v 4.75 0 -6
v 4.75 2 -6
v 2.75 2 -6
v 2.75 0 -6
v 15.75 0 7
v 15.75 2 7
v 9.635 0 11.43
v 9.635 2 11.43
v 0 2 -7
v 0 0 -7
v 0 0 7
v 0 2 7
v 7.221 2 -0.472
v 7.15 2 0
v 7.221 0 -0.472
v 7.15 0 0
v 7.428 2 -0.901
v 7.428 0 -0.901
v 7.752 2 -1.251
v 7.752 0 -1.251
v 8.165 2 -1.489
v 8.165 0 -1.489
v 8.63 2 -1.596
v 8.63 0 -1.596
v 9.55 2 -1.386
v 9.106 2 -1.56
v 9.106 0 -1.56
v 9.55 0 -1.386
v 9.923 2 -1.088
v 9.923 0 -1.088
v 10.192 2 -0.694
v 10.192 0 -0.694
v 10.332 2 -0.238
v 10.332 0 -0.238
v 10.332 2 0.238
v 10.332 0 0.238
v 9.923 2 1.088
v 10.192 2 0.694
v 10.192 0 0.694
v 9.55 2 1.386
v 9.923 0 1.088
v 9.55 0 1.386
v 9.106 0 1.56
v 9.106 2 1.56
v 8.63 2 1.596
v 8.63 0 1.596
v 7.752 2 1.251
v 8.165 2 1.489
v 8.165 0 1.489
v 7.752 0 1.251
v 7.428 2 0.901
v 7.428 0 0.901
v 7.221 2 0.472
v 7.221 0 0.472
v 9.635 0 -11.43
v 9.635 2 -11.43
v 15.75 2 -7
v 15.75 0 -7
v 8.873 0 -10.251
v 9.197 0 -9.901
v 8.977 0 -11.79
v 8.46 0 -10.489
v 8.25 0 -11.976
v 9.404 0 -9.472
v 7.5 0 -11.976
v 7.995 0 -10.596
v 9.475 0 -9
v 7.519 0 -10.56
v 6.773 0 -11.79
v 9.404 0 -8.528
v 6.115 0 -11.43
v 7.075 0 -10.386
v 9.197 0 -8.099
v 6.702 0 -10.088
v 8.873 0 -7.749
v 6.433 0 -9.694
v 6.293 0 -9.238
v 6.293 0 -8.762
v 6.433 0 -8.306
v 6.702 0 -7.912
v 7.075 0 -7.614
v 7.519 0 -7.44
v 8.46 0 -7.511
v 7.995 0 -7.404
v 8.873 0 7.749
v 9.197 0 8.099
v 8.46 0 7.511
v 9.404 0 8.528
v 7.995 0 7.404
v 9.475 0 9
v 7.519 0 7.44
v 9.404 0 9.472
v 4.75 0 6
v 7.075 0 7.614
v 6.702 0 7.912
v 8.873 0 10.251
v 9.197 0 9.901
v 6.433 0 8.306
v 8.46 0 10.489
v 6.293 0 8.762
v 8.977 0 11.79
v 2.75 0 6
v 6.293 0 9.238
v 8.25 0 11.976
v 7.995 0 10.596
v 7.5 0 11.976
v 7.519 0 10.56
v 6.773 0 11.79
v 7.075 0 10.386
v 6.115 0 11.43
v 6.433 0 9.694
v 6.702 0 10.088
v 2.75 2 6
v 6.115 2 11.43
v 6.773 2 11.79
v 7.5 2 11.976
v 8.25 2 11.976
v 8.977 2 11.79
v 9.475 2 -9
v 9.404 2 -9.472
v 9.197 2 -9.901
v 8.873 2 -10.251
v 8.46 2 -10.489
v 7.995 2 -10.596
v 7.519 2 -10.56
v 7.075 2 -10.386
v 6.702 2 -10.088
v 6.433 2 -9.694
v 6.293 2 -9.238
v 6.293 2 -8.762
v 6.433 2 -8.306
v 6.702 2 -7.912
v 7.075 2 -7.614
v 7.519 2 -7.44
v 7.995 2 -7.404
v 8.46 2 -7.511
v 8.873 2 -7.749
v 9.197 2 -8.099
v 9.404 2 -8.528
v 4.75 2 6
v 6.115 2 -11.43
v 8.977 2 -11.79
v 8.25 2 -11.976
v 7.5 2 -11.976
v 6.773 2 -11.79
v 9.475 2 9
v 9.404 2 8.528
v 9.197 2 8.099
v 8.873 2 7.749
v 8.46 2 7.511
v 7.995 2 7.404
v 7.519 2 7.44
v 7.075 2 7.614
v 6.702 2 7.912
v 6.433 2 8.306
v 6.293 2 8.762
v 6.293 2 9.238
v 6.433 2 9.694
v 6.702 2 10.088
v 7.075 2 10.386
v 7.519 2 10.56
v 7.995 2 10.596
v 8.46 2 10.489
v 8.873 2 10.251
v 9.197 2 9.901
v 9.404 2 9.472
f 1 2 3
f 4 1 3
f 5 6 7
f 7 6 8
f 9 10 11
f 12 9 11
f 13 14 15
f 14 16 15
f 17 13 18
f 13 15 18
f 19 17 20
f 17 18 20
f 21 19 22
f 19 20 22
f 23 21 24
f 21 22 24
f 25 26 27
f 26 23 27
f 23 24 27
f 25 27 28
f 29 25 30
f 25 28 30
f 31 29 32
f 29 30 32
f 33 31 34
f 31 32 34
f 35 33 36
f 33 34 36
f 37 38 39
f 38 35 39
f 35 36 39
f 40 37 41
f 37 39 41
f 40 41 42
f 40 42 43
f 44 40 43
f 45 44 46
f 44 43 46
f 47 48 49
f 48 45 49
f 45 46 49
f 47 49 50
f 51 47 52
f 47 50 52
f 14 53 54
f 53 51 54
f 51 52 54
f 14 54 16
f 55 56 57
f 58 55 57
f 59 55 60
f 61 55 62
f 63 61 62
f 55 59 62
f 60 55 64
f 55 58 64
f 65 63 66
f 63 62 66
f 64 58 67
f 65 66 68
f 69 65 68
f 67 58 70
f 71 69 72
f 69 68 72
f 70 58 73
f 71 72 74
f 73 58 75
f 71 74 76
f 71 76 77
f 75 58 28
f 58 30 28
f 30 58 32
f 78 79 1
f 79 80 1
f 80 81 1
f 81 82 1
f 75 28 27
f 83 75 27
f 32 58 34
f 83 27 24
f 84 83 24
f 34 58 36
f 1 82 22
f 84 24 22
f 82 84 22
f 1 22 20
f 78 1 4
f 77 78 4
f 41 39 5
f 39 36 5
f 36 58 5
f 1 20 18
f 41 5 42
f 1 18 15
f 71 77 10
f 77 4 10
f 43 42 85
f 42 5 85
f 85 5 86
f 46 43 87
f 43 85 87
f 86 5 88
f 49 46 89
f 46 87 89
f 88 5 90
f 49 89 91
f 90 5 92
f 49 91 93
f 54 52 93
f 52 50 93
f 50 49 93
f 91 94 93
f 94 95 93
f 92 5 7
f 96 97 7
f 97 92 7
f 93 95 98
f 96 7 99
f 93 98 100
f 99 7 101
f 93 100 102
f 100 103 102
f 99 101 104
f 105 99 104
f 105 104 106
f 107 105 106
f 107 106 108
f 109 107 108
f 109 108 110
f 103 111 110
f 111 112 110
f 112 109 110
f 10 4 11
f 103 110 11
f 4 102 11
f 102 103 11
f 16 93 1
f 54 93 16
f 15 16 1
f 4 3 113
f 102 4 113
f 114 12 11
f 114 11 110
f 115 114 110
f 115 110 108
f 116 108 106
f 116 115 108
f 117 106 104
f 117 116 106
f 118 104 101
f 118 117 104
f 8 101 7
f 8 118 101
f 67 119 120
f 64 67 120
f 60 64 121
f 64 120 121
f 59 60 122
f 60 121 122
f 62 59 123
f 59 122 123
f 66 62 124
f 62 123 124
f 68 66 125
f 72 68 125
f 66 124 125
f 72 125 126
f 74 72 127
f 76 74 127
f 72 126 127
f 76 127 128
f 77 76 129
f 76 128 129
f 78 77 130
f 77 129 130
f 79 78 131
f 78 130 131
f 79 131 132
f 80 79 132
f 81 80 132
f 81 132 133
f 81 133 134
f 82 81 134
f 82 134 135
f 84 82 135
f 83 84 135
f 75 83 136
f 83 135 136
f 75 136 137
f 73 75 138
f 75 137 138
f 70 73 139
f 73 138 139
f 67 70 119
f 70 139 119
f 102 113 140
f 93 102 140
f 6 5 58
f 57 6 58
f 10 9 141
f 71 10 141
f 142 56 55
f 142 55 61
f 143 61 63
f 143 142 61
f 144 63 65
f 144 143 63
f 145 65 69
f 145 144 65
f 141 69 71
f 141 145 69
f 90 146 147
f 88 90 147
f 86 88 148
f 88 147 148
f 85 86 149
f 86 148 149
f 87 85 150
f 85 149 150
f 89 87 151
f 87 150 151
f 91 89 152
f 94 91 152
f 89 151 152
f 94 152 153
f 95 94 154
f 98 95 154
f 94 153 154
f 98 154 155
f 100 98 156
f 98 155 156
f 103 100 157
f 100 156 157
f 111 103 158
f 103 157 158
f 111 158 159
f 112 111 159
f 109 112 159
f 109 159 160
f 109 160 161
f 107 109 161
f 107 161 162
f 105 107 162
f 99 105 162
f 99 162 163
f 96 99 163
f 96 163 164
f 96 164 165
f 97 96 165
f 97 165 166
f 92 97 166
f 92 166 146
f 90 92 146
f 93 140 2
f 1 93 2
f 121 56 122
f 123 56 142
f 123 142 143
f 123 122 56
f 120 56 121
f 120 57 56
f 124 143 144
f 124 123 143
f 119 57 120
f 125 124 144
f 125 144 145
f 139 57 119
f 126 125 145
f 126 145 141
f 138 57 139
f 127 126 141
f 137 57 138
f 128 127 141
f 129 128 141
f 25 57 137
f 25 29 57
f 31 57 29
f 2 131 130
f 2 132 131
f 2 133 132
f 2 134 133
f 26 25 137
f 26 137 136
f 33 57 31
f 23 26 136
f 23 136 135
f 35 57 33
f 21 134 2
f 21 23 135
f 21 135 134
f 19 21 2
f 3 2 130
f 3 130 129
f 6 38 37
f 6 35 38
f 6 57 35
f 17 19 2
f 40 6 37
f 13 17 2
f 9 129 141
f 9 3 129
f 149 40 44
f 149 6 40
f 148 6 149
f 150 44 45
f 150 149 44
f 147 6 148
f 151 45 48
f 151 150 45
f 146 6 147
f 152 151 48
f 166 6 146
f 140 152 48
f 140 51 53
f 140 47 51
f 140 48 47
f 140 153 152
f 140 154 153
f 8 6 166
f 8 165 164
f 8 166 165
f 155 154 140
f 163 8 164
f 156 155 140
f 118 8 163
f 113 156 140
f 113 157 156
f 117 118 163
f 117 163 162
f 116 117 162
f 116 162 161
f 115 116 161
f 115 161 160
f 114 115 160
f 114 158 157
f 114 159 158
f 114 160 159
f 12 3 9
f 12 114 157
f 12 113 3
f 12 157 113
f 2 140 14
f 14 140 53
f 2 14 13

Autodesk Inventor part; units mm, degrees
ref_plane "YZ Plane" through (0, 0, 0) normal (1, 0, 0) x (0, 1, 0)
ref_plane "XZ Plane" through (0, 0, 0) normal (0, 1, 0) x (-1, 0, 0)
ref_plane "XY Plane" through (0, 0, 0) normal (0, 0, 1) x (1, 0, 0)
sketch "Эскиз1" plane through (0, 0, 0) normal (0, 1, 0) x (-1, 0, 0)
  line L0 (-15.75, 7) -> (15.75, 7) construction
  line L1 (15.75, 7) -> (15.75, -7) construction
  line L2 (15.75, -7) -> (-15.75, -7) construction
  line L3 (-15.75, -7) -> (-15.75, 7) construction
  line L4 (-15.75, 7) -> (15.75, -7) construction
  line L5 (15.75, 7) -> (-15.75, -7) construction
  line L6 (0, 7) -> (-15.75, 7)
  line L7 (-15.75, 7) -> (-15.75, -7)
  line L8 (-15.75, -7) -> (0, -7)
  line L9 (0, -7) -> (0, 7)
  circle A0 centre (-8.75, 0) radius 1.6
  point P0 (0, 0)
  dimension "d0" = 31.5
  dimension "d1" = 14
  dimension "d2" = 3.2
  dimension "d3" = 7
extrude "Выдавливание1" add sketch "Эскиз1" along normal blind 2
sketch "Эскиз2" plane through (0, 2, 0) normal (0, 1, 0) x (1, 0, 0)
  circle A0 centre (8.75, 0) radius 1.6 projected
  circle A1 centre (7.875, 9) radius 1.6
  circle A2 centre (7.875, -9) radius 1.6
  line L0 (0, -7) -> (15.75, -7) projected
  line L1 (15.75, 7) -> (0, 7) projected
  circle A3 centre (7.875, -9) radius 3
  circle A4 centre (7.875, 9) radius 3
  line L2 (0, 7) -> (6.1151, 11.4296)
  line L3 (9.6349, 11.4296) -> (15.75, 7)
  line L4 (15.75, -7) -> (15.75, 7) projected
  line L5 (0, 7) -> (0, -7) projected
  line L6 (0, -7) -> (6.1151, -11.4296)
  line L7 (15.75, -7) -> (9.6349, -11.4296)
  line L8 (7.875, 9) -> (7.875, -16.4074) construction
  point P0 (0, 0)
  point P1 (5.8526, -11.2158)
  point P2 (8.7863, -11.8582)
  point P3 (10.1111, -7)
  point P4 (5.6389, -7)
  dimension "d6" = 3.2
  dimension "d7" = 3.2
  dimension "d9" = 2
  dimension "d10" = 6
  dimension "d11" = 6
  dimension "d14" = 2
extrude "Выдавливание2" add sketch "Эскиз2" against normal blind 2 contours L0 A3 L6 | A3 L0 | L0 A3 | L2 A4 L1 | L0 L7 A3 | A4 L1 | A4 L3 L1 picked at (7.8107, 7.1372)
sketch "Эскиз3" plane through (0, 2, 0) normal (0, 1, 0) x (1, 0, 0)
  line L0 (2.75, -6) -> (4.75, -6)
  line L1 (4.75, -6) -> (4.75, 6)
  line L2 (4.75, 6) -> (2.75, 6)
  line L3 (2.75, 6) -> (2.75, -6)
  line L4 (2.75, -6) -> (4.75, 6) construction
  line L5 (4.75, -6) -> (2.75, 6) construction
  circle A0 centre (8.75, 0) radius 1.6 projected
  point P0 (0, 0)
  point P1 (3.75, 0)
  dimension "d15" = 2
  dimension "d16" = 12
  dimension "d17" = 5
extrude "Выдавливание4" cut sketch "Эскиз3" against normal blind 2 contours L3 L2 L1 L0
properties part number "креп_отп_каретка"
